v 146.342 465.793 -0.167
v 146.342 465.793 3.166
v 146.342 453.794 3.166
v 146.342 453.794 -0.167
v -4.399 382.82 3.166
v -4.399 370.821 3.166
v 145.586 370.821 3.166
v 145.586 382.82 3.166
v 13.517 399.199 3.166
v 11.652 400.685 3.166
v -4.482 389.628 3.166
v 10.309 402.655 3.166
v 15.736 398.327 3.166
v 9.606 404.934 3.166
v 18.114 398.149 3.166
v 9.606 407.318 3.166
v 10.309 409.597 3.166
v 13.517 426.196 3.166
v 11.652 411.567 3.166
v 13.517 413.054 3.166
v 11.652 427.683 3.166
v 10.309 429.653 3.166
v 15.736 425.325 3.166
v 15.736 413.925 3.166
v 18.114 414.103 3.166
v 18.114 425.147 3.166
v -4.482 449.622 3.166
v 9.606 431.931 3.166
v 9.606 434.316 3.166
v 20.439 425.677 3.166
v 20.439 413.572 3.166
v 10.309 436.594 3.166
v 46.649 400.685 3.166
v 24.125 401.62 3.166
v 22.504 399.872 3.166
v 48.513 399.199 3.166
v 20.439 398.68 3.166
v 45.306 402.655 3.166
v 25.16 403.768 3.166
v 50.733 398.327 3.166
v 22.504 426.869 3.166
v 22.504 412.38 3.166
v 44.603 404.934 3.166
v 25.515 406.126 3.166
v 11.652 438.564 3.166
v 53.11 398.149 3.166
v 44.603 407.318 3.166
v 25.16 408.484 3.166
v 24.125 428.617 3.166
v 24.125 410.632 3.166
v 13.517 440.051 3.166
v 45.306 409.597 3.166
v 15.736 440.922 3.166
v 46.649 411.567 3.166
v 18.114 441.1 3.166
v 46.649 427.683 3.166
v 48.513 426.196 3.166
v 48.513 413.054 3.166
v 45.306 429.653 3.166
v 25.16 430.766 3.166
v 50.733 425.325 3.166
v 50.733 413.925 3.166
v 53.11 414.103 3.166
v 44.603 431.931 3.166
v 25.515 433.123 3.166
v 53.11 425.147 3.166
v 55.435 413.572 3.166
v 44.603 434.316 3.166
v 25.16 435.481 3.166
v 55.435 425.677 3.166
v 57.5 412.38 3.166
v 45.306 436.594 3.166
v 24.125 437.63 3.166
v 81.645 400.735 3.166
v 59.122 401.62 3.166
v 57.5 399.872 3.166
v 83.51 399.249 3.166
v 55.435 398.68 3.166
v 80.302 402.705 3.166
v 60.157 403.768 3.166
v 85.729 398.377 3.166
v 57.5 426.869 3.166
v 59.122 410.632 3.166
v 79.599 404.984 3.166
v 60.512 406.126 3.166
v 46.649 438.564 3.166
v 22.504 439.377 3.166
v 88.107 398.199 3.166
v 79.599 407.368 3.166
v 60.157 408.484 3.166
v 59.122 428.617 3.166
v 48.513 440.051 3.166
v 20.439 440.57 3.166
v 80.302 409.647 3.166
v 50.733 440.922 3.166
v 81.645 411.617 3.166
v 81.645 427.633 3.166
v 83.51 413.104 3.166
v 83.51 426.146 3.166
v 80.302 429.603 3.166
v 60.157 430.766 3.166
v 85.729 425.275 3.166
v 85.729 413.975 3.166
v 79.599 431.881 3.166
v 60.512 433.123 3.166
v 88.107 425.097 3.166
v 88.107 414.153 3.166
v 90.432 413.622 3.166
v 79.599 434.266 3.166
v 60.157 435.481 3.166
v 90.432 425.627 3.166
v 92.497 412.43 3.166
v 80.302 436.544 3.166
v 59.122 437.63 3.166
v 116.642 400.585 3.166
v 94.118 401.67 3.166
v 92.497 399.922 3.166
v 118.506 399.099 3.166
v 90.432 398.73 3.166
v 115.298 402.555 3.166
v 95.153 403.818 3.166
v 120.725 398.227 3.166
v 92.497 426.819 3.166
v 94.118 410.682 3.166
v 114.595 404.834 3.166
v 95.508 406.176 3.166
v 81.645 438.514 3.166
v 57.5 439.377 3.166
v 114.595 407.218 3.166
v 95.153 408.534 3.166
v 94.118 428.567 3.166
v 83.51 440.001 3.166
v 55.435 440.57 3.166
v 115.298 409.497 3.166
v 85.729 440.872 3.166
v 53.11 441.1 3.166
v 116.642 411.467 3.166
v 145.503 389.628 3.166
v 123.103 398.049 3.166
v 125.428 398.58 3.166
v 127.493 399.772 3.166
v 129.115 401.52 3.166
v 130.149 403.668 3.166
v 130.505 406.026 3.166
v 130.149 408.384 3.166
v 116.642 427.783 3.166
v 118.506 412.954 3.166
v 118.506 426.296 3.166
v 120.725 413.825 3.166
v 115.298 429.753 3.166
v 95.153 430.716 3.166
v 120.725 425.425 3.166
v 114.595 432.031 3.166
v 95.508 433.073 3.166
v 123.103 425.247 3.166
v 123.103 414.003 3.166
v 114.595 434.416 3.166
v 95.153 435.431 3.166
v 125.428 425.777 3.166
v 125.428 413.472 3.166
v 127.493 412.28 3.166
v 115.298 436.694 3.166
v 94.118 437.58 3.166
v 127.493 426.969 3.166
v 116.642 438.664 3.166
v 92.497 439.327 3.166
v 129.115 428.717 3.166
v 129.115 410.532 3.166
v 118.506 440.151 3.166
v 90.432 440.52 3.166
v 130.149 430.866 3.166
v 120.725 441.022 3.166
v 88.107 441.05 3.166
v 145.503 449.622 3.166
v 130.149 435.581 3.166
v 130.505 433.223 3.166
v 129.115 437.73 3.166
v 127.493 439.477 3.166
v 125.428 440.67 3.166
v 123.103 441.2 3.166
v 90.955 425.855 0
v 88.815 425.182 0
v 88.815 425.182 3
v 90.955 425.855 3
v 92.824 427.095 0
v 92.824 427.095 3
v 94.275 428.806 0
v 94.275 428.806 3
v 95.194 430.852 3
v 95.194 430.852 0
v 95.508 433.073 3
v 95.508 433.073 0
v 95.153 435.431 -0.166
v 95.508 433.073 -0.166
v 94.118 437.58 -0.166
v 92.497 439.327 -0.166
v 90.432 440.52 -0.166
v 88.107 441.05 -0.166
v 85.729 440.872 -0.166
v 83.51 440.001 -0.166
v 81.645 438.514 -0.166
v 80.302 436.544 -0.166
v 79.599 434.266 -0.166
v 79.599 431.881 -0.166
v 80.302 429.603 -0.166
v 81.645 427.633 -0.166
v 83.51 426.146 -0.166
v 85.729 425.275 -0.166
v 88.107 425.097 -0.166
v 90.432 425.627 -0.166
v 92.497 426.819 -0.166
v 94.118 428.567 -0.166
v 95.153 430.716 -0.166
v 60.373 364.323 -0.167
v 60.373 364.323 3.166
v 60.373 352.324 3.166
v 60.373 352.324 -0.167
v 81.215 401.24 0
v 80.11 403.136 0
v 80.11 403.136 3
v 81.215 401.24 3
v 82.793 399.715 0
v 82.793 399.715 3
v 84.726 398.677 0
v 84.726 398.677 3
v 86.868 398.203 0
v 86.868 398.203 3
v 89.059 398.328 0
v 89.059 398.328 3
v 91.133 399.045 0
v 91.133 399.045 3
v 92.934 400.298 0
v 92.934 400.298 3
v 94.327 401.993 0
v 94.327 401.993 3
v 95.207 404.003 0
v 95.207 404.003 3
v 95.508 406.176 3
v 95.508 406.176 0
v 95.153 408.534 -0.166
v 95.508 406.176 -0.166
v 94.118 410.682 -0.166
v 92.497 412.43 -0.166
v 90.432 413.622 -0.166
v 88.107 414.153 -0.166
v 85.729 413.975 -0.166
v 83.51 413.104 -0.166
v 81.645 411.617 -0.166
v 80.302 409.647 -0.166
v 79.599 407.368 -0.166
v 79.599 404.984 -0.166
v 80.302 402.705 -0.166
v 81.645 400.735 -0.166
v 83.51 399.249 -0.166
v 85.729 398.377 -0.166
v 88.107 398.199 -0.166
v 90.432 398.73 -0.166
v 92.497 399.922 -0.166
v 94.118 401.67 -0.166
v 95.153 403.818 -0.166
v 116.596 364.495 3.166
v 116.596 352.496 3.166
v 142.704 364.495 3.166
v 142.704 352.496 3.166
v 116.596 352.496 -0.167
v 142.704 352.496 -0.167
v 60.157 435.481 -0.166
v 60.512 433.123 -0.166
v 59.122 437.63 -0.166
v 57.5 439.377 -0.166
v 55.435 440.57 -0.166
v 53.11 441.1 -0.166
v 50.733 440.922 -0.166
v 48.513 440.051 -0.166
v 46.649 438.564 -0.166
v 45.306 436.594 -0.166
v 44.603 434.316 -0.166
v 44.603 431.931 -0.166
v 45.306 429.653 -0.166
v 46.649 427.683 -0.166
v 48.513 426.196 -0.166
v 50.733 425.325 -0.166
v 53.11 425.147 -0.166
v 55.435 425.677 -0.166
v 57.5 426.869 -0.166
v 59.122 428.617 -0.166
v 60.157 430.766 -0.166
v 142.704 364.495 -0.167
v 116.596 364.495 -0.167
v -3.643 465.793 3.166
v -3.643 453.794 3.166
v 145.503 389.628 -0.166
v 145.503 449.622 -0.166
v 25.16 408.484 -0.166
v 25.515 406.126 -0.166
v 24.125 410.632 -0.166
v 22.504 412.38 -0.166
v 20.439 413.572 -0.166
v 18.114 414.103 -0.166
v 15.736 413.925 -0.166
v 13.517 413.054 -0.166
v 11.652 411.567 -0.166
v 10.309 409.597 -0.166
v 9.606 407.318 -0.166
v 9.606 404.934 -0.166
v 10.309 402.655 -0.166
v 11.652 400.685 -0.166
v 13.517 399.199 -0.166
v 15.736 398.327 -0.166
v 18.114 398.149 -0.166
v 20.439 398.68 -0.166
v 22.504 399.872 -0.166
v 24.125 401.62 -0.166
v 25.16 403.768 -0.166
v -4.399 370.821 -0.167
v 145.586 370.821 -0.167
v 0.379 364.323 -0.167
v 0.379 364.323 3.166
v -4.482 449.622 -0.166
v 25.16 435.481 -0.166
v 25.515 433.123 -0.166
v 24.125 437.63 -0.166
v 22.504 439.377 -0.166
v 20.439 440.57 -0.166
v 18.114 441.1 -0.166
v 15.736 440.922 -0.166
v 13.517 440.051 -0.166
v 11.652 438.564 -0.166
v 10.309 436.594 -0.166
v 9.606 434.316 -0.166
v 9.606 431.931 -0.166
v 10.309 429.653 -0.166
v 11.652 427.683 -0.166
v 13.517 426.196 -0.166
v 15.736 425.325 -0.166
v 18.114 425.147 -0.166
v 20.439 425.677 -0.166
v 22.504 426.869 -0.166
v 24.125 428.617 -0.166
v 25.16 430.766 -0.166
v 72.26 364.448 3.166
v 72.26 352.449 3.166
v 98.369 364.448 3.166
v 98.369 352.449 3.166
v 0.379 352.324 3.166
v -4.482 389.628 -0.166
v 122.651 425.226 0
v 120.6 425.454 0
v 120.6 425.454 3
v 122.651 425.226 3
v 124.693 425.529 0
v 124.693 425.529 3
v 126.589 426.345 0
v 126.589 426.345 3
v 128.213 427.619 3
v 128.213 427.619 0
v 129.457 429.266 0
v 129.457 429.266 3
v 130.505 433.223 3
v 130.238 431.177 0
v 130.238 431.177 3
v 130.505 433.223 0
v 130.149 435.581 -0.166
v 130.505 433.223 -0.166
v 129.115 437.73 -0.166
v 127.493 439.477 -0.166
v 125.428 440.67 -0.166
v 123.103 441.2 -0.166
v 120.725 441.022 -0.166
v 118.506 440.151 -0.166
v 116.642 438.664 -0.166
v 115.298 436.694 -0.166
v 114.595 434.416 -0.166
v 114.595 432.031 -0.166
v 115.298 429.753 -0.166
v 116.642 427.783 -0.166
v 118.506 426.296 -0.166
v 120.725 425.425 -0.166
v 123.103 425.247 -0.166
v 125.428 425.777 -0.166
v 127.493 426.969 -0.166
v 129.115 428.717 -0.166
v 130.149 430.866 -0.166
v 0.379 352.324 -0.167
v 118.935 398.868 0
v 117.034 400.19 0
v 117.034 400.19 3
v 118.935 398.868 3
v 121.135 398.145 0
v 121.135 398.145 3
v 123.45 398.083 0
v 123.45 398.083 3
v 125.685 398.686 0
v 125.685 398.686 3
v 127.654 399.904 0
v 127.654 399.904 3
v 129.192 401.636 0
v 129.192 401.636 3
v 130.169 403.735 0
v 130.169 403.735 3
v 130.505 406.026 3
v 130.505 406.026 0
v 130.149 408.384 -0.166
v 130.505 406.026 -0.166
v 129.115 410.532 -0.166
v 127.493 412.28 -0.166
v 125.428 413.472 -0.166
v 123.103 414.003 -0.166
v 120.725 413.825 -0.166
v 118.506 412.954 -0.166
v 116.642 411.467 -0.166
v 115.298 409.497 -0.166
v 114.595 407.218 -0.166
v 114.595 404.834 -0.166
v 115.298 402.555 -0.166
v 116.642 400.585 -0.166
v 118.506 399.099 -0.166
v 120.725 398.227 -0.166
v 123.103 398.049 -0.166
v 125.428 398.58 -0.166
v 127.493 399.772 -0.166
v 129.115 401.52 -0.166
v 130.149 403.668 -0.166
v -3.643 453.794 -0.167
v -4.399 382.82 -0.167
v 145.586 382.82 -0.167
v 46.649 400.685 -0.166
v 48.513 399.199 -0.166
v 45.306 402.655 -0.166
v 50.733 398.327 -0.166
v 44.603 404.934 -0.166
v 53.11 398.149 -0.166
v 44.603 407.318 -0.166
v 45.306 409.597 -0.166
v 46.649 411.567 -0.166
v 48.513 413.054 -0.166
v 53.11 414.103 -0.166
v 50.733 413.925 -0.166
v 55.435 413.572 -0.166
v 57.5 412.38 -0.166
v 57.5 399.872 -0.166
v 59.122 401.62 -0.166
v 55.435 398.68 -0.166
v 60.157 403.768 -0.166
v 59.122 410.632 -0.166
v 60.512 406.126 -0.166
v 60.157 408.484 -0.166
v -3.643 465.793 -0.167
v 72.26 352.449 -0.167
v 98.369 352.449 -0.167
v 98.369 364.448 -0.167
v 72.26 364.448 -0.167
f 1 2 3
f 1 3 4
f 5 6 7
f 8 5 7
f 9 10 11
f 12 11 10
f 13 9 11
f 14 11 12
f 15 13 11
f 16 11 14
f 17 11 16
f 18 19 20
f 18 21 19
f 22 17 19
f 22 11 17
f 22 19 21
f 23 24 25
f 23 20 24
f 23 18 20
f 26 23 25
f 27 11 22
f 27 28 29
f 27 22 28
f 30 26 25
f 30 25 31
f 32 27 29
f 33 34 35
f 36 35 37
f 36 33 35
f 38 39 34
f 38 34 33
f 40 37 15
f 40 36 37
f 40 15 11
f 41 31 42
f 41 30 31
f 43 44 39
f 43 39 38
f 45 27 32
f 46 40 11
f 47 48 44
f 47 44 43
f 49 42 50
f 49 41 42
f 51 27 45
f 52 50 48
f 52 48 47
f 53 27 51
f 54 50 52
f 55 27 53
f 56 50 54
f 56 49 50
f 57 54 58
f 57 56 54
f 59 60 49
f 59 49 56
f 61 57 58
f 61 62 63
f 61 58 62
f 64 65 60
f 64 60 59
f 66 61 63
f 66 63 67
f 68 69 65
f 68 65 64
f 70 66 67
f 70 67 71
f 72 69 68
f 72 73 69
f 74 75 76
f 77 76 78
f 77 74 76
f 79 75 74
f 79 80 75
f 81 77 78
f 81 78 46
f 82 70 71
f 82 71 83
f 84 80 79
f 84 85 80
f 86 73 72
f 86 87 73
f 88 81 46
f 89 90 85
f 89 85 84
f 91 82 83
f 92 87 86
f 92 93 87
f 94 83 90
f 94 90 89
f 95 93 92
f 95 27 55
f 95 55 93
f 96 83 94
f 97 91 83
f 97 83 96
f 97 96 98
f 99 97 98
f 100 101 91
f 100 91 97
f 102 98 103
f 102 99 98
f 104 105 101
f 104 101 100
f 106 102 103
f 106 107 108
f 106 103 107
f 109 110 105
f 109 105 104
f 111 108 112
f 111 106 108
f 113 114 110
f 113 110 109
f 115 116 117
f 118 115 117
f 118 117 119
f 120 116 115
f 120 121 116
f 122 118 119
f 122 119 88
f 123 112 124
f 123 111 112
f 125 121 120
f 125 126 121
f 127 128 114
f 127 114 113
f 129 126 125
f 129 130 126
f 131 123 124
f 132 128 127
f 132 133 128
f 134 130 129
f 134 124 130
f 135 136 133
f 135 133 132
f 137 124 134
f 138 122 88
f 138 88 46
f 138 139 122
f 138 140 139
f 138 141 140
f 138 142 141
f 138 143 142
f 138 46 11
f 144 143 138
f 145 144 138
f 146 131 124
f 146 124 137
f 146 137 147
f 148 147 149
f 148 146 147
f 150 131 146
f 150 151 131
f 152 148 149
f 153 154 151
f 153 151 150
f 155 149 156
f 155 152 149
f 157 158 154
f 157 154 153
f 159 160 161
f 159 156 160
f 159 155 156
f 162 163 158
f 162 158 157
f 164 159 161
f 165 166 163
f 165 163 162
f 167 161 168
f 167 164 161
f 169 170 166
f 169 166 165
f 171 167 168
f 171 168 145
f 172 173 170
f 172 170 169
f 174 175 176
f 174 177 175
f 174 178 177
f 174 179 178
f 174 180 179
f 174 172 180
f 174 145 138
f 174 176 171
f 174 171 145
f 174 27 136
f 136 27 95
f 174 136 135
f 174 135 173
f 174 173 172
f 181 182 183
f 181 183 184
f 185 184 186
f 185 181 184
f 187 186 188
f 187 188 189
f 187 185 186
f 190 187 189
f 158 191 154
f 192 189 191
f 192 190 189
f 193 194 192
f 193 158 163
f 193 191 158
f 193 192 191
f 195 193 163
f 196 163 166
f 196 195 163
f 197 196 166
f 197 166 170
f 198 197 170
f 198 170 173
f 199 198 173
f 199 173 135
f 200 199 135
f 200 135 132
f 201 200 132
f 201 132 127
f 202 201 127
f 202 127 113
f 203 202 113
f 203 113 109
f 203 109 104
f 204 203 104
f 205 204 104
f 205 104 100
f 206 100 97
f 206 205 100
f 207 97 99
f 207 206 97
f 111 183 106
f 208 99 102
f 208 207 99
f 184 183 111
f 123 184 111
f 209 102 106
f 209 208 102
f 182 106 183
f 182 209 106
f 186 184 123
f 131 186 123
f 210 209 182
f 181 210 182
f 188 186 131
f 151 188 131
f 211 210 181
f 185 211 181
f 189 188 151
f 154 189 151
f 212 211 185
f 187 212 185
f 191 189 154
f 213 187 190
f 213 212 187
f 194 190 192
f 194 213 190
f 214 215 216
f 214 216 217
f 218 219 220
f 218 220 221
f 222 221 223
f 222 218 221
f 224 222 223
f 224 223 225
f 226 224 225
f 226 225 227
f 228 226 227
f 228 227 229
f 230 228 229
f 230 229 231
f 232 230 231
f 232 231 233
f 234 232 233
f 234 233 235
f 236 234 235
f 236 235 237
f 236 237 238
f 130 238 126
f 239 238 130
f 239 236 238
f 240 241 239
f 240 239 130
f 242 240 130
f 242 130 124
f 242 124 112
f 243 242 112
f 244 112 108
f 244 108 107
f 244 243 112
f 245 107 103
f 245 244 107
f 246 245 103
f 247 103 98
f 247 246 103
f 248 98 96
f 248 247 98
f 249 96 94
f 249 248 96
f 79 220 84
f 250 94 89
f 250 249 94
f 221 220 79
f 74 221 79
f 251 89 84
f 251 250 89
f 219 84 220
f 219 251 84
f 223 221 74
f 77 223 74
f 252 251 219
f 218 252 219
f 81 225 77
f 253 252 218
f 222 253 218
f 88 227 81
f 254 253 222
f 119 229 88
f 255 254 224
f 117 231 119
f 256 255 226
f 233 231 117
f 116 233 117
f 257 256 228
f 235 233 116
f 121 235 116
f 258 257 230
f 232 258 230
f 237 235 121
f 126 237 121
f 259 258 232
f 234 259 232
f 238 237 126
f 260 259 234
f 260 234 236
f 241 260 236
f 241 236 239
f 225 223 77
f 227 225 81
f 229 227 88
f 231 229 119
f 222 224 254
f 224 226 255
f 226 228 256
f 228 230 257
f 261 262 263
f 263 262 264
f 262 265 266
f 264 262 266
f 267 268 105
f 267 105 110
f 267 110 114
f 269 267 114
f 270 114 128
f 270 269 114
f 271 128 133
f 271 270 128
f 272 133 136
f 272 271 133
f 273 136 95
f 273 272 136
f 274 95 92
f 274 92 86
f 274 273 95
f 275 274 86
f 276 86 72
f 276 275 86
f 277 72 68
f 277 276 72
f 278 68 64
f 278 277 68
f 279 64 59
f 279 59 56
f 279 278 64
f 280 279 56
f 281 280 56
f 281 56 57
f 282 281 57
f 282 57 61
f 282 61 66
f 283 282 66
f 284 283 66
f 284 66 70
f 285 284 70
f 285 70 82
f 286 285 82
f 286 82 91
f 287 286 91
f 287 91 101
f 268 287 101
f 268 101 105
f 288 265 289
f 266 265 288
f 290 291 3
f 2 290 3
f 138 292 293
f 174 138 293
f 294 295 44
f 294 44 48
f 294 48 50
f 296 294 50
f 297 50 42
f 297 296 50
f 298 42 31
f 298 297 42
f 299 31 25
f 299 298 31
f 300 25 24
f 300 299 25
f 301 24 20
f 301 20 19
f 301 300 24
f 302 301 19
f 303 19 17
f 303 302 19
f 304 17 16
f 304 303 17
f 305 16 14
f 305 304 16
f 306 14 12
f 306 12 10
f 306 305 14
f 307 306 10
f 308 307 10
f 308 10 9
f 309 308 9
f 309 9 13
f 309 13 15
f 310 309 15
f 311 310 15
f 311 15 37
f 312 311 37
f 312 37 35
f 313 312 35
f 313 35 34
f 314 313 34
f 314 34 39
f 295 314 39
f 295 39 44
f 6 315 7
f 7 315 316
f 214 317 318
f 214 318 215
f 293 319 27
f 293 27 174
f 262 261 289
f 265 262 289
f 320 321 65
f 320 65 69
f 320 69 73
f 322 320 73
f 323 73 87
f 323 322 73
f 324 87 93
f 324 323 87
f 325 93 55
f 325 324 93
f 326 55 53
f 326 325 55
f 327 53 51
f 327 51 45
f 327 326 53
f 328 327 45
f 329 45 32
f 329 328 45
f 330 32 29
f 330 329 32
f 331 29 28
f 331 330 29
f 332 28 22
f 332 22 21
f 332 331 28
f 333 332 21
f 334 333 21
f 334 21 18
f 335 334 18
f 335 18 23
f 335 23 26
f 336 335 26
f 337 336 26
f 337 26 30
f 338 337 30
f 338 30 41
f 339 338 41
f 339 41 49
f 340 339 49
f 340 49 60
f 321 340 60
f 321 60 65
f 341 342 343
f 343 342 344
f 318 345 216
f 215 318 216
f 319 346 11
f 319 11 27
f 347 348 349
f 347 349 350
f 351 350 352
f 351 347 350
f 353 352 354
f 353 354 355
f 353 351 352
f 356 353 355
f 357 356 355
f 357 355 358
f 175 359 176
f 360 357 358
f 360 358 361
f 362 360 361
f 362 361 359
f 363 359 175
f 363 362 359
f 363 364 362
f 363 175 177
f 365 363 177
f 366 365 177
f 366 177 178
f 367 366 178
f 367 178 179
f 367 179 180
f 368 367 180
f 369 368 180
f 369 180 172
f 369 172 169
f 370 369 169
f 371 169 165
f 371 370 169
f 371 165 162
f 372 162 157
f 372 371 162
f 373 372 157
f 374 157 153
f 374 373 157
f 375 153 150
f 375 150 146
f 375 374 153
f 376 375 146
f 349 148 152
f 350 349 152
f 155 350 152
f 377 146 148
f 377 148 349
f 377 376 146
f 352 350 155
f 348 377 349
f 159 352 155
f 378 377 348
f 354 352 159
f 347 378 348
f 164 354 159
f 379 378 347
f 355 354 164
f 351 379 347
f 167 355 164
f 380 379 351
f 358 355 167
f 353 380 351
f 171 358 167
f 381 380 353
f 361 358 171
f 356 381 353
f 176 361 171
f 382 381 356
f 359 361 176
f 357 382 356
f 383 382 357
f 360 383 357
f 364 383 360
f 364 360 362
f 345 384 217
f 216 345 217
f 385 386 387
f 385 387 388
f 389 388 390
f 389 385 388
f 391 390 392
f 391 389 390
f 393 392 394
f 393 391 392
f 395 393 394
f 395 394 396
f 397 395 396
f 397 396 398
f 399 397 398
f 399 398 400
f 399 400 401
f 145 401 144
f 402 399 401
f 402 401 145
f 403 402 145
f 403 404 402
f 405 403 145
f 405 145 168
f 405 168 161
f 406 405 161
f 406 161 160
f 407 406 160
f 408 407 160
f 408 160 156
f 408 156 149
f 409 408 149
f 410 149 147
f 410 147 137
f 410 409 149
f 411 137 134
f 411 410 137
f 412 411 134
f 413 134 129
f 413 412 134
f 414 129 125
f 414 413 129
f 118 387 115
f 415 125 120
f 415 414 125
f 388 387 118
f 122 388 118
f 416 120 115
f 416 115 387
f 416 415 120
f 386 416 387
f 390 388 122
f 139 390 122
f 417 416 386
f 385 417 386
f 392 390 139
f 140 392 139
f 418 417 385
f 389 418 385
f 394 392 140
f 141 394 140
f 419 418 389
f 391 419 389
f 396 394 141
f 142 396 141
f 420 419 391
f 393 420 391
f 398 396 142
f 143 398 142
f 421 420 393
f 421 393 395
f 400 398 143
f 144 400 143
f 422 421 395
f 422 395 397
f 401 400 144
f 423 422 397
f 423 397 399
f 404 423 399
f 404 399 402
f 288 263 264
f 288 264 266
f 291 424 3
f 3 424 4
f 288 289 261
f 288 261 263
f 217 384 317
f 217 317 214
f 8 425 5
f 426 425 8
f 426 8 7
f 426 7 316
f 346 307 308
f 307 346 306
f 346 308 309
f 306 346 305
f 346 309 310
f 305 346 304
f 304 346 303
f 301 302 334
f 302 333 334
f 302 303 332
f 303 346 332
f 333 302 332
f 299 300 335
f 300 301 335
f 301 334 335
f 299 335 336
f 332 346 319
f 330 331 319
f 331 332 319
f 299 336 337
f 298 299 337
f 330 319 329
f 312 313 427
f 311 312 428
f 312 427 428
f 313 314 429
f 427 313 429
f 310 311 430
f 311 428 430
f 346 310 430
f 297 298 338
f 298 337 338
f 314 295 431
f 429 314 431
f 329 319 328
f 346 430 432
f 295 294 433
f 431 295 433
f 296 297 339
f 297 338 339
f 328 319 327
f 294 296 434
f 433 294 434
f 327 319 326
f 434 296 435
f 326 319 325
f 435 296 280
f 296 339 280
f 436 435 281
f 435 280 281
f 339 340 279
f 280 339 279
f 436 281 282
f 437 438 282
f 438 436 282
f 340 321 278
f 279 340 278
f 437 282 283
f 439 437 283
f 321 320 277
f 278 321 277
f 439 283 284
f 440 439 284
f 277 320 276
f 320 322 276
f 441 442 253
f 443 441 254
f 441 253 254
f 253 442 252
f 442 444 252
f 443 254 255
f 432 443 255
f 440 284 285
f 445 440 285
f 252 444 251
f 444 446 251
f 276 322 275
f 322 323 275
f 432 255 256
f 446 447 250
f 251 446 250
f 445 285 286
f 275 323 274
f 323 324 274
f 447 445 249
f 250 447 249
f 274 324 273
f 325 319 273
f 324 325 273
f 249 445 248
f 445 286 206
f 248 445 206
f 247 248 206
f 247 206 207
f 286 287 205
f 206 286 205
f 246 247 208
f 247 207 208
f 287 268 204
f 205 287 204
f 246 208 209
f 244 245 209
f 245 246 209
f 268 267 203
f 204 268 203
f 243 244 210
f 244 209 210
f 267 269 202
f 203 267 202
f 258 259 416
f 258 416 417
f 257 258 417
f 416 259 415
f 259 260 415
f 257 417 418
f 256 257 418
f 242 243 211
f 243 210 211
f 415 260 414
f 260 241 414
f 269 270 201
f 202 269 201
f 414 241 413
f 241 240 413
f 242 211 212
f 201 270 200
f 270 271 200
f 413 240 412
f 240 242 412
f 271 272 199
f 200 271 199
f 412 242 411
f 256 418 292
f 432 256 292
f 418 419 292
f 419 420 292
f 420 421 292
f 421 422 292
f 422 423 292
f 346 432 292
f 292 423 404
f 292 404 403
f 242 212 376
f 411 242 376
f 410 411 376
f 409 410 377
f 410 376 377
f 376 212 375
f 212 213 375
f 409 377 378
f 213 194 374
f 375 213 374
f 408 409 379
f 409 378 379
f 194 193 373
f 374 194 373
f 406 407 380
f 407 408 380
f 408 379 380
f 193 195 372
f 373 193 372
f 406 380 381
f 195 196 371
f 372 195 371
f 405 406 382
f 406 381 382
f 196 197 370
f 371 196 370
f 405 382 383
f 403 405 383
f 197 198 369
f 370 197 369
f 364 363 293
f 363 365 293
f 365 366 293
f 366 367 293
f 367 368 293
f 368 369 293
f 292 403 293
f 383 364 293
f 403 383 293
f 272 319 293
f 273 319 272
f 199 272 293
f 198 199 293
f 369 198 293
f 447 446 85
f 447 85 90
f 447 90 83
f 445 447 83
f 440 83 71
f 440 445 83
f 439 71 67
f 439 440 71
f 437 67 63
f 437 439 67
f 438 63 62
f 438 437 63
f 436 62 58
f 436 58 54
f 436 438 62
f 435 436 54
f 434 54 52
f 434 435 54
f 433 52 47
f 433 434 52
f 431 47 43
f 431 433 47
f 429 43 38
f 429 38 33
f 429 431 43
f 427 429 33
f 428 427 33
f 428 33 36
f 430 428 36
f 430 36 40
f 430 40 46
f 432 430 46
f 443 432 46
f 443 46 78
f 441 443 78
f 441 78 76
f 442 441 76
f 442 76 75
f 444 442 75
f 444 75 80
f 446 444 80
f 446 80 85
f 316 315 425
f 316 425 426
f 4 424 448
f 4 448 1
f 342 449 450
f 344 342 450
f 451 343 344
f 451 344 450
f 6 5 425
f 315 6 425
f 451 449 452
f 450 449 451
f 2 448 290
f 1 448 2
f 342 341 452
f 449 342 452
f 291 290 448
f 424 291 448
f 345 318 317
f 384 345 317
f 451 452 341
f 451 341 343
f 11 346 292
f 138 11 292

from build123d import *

# Parameters (mm, degrees)
MODEL_W               = 135
MODEL_H               = 54
MODEL_R               = 7.2
BOSS_EXTRUDE1_DEPTH   = 3
MODEL_W_2             = 54
MODEL_H_2             = 10.8
BOSS_EXTRUDE1_2_DEPTH = 3
BOSS_EXTRUDE1_3_DEPTH = 3
MODEL_W_3             = 23.5
BOSS_EXTRUDE1_4_DEPTH = 3
BOSS_EXTRUDE1_5_DEPTH = 3
BOSS_EXTRUDE1_6_DEPTH = 3
SCALE1_DEPTH          = 3
SCALE1_START          = -0.1665
SCALE1_2_OUTLINE_W    = 149.985
SCALE1_2_OUTLINE_H    = 59.994
SCALE1_2_OUTLINE_R    = 7.9992
SCALE1_2_DEPTH        = 3.333
SCALE1_START_2        = 446.653714964
SCALE1_3_OUTLINE_W    = 149.985
SCALE1_3_OUTLINE_H    = 3.333
SCALE1_3_DEPTH        = 11.9988
SCALE1_START_3        = 369.383026174
SCALE1_4_OUTLINE_W    = 26.1085
SCALE1_4_OUTLINE_H    = 3.333
SCALE1_4_DEPTH        = 11.9988
SCALE1_START_4        = 369.335990799
SCALE1_5_OUTLINE_W    = 26.1085
SCALE1_5_OUTLINE_H    = 3.333
SCALE1_5_DEPTH        = 11.9988
SCALE1_START_5        = 369.210927513
SCALE1_6_OUTLINE_W    = 59.994
SCALE1_6_OUTLINE_H    = 3.333
SCALE1_6_DEPTH        = 11.9988
SCALE1_START_6        = 380.646561708
SCALE1_7_OUTLINE_W    = 149.985
SCALE1_7_OUTLINE_H    = 3.333
SCALE1_7_DEPTH        = 11.9988


# Read off the part's stored shape, not the designer's step: Scale1
with BuildPart() as part:
    # Model → Boss-Extrude1 (new body)
    with BuildSketch(Plane.XY):
        with Locations((70.521412424, 419.624764679)):
            Rectangle(MODEL_W, MODEL_H)
        with Locations((117.321412424, 431.864764679)):
            Circle(MODEL_R, mode=Mode.SUBTRACT)
        with Locations((54.321733854, 407.474764679)):
            Circle(MODEL_R, mode=Mode.SUBTRACT)
        with Locations((22.821733854, 431.774764679)):
            Circle(MODEL_R, mode=Mode.SUBTRACT)
        with Locations((22.821733854, 407.474764679)):
            Circle(MODEL_R, mode=Mode.SUBTRACT)
        with Locations((117.321412424, 407.384764679)):
            Circle(MODEL_R, mode=Mode.SUBTRACT)
        with Locations((85.821701711, 431.729764679)):
            Circle(MODEL_R, mode=Mode.SUBTRACT)
        with Locations((85.821701711, 407.519764679)):
            Circle(MODEL_R, mode=Mode.SUBTRACT)
        with Locations((54.321733854, 431.774764679)):
            Circle(MODEL_R, mode=Mode.SUBTRACT)
    extrude(amount=BOSS_EXTRUDE1_DEPTH)

    # Scale1 outline → Scale1 (cut)
    with BuildSketch(Plane.XY):
        with BuildLine():
            ThreePointArc((120.599852685, 425.454473776), (130.243207193, 435.251393662), (117.034279248, 439.059037022))
            ThreePointArc((117.034279248, 439.059037022), (124.286181967, 433.690137301), (120.599852685, 425.454473776))
        make_face()
        with BuildLine():
            ThreePointArc((59.775926661, 402.774575233), (48.549318786, 403.171367849), (51.374507231, 414.04392408))
            ThreePointArc((51.374507231, 414.04392408), (46.099552197, 401.3450408), (59.775926661, 402.774575233))
        make_face()
        with BuildLine():
            ThreePointArc((19.516367614, 425.378316132), (15.843653478, 433.548572523), (22.972146088, 438.973193408))
            ThreePointArc((22.972146088, 438.973193408), (9.76355804, 435.094115194), (19.516367614, 425.378316132))
        make_face()
        with BuildLine():
            ThreePointArc((22.972146088, 400.27633595), (15.843653478, 405.700956835), (19.516367614, 413.871213226))
            ThreePointArc((19.516367614, 413.871213226), (9.76355804, 404.155414164), (22.972146088, 400.27633595))
        make_face()
        with BuildLine():
            ThreePointArc((117.034279248, 400.190492336), (130.243207193, 403.998135696), (120.599852685, 413.795055582))
            ThreePointArc((120.599852685, 413.795055582), (124.286181967, 405.559392057), (117.034279248, 400.190492336))
        make_face()
        with BuildLine():
            ThreePointArc((88.815187829, 425.181555698), (93.766910466, 438.056177976), (80.110310207, 436.11382753))
            ThreePointArc((80.110310207, 436.11382753), (91.454231718, 436.21469564), (88.815187829, 425.181555698))
        make_face()
        with BuildLine():
            ThreePointArc((80.110310207, 403.135701828), (93.766910466, 401.193351382), (88.815187829, 414.06797366))
            ThreePointArc((88.815187829, 414.06797366), (91.454231718, 403.034833718), (80.110310207, 403.135701828))
        make_face()
        with BuildLine():
            ThreePointArc((51.374507231, 425.205605278), (48.549318786, 436.078161509), (59.775926661, 436.474954125))
            ThreePointArc((59.775926661, 436.474954125), (46.099552197, 437.904488558), (51.374507231, 425.205605278))
        make_face()
    extrude(amount=SCALE1_DEPTH, mode=Mode.SUBTRACT)

    # Scale1 2 outline → Scale1 2 (add)
    with BuildSketch(Plane.XY.offset(SCALE1_START)):
        with Locations((70.51054823, 419.624764679)):
            Rectangle(SCALE1_2_OUTLINE_W, SCALE1_2_OUTLINE_H)
        with Locations((87.509169628, 433.073419679)):
            Circle(SCALE1_2_OUTLINE_R, mode=Mode.SUBTRACT)
        with Locations((122.50534823, 433.223404679)):
            Circle(SCALE1_2_OUTLINE_R, mode=Mode.SUBTRACT)
        with Locations((17.516205338, 406.126114679)):
            Circle(SCALE1_2_OUTLINE_R, mode=Mode.SUBTRACT)
        with Locations((52.512705338, 406.126114679)):
            Circle(SCALE1_2_OUTLINE_R, mode=Mode.SUBTRACT)
        with Locations((87.509169628, 406.176109679)):
            Circle(SCALE1_2_OUTLINE_R, mode=Mode.SUBTRACT)
        with Locations((122.50534823, 406.026124679)):
            Circle(SCALE1_2_OUTLINE_R, mode=Mode.SUBTRACT)
        with Locations((17.516205338, 433.123414679)):
            Circle(SCALE1_2_OUTLINE_R, mode=Mode.SUBTRACT)
        with Locations((52.512705338, 433.123414679)):
            Circle(SCALE1_2_OUTLINE_R, mode=Mode.SUBTRACT)
    extrude(amount=SCALE1_2_DEPTH)


with BuildPart() as body_2:
    # Model → Boss-Extrude1 2 (new body)
    with BuildSketch(Plane.XY):
        with Locations((30.375615719, 375.210327513)):
            Rectangle(MODEL_W_2, MODEL_H_2)
    extrude(amount=BOSS_EXTRUDE1_2_DEPTH)

    # Scale1 6 outline → Scale1 6 (add)
    with BuildSketch(Plane(origin=(0, 0, 0), x_dir=(1, 0, 0), z_dir=(0, 1, 0)).offset(SCALE1_START_5)):
        with Locations((30.375615719, -1.5)):
            Rectangle(SCALE1_6_OUTLINE_W, SCALE1_6_OUTLINE_H)
    extrude(amount=SCALE1_6_DEPTH)


with BuildPart() as body_3:
    # Model → Boss-Extrude1 3 (new body)
    with BuildSketch(Plane.XY):
        with Locations((70.593048587, 386.645961708)):
            Rectangle(MODEL_W, MODEL_H_2)
    extrude(amount=BOSS_EXTRUDE1_3_DEPTH)

    # Scale1 7 outline → Scale1 7 (add)
    with BuildSketch(Plane(origin=(0, 0, 0), x_dir=(1, 0, 0), z_dir=(0, 1, 0)).offset(SCALE1_START_6)):
        with Locations((70.593048587, -1.5)):
            Rectangle(SCALE1_7_OUTLINE_W, SCALE1_7_OUTLINE_H)
    extrude(amount=SCALE1_7_DEPTH)


with BuildPart() as body_4:
    # Model → Boss-Extrude1 4 (new body)
    with BuildSketch(Plane.XY):
        with Locations((94.586456263, 375.382426174)):
            Rectangle(MODEL_W_3, MODEL_H_2)
    extrude(amount=BOSS_EXTRUDE1_4_DEPTH)

    # Scale1 4 outline → Scale1 4 (add)
    with BuildSketch(Plane(origin=(0, 0, 0), x_dir=(1, 0, 0), z_dir=(0, 1, 0)).offset(SCALE1_START_3)):
        with Locations((94.586456263, -1.5)):
            Rectangle(SCALE1_4_OUTLINE_W, SCALE1_4_OUTLINE_H)
    extrude(amount=SCALE1_4_DEPTH)


with BuildPart() as body_5:
    # Model → Boss-Extrude1 5 (new body)
    with BuildSketch(Plane.XY):
        with Locations((71.349818497, 452.653114964)):
            Rectangle(MODEL_W, MODEL_H_2)
    extrude(amount=BOSS_EXTRUDE1_5_DEPTH)

    # Scale1 3 outline → Scale1 3 (add)
    with BuildSketch(Plane(origin=(0, 0, 0), x_dir=(1, 0, 0), z_dir=(0, 1, 0)).offset(SCALE1_START_2)):
        with Locations((71.349818497, -1.5)):
            Rectangle(SCALE1_3_OUTLINE_W, SCALE1_3_OUTLINE_H)
    extrude(amount=SCALE1_3_DEPTH)


with BuildPart() as body_6:
    # Model → Boss-Extrude1 6 (new body)
    with BuildSketch(Plane.XY):
        with Locations((70.178845551, 375.335390799)):
            Rectangle(MODEL_W_3, MODEL_H_2)
    extrude(amount=BOSS_EXTRUDE1_6_DEPTH)

    # Scale1 5 outline → Scale1 5 (add)
    with BuildSketch(Plane(origin=(0, 0, 0), x_dir=(1, 0, 0), z_dir=(0, 1, 0)).offset(SCALE1_START_4)):
        with Locations((70.178845551, -1.5)):
            Rectangle(SCALE1_5_OUTLINE_W, SCALE1_5_OUTLINE_H)
    extrude(amount=SCALE1_5_DEPTH)


with BuildPart() as body_3_1:
    # Body-Move/Copy1: moved
    add(body_3.part.moved(Location((0, -9.825424502, 0))))


with BuildPart() as body_2_1:
    # Body-Move/Copy1: moved
    add(body_2.part.moved(Location((0, -9.825424502, 0))))


with BuildPart() as body_6_1:
    # Body-Move/Copy1: moved
    add(body_6.part.moved(Location((0, -9.825424502, 0))))


with BuildPart() as body_4_1:
    # Body-Move/Copy1: moved
    add(body_4.part.moved(Location((0, -9.825424502, 0))))


with BuildPart() as body_2_2:
    # Body-Move/Copy3: moved
    add(body_2_1.part.moved(Location((0, -7.061484852, 0))))


with BuildPart() as body_6_2:
    # Body-Move/Copy3: moved
    add(body_6_1.part.moved(Location((0, -7.061484852, 0))))


with BuildPart() as body_4_2:
    # Body-Move/Copy3: moved
    add(body_4_1.part.moved(Location((0, -7.061484852, 0))))


with BuildPart() as body_4_3:
    # Body-Move/Copy4: moved
    add(body_4_2.part.moved(Location((35.063669181, 0, 0))))


with BuildPart() as body_6_3:
    # Body-Move/Copy5: moved
    add(body_6_2.part.moved(Location((15.135881893, 0, 0))))


with BuildPart() as body_5_1:
    # Body-Move/Copy6: moved
    add(body_5.part.moved(Location((0, 7.140723713, 0))))


solid = Compound([part.part, body_3_1.part, body_2_2.part, body_4_3.part, body_6_3.part, body_5_1.part])
